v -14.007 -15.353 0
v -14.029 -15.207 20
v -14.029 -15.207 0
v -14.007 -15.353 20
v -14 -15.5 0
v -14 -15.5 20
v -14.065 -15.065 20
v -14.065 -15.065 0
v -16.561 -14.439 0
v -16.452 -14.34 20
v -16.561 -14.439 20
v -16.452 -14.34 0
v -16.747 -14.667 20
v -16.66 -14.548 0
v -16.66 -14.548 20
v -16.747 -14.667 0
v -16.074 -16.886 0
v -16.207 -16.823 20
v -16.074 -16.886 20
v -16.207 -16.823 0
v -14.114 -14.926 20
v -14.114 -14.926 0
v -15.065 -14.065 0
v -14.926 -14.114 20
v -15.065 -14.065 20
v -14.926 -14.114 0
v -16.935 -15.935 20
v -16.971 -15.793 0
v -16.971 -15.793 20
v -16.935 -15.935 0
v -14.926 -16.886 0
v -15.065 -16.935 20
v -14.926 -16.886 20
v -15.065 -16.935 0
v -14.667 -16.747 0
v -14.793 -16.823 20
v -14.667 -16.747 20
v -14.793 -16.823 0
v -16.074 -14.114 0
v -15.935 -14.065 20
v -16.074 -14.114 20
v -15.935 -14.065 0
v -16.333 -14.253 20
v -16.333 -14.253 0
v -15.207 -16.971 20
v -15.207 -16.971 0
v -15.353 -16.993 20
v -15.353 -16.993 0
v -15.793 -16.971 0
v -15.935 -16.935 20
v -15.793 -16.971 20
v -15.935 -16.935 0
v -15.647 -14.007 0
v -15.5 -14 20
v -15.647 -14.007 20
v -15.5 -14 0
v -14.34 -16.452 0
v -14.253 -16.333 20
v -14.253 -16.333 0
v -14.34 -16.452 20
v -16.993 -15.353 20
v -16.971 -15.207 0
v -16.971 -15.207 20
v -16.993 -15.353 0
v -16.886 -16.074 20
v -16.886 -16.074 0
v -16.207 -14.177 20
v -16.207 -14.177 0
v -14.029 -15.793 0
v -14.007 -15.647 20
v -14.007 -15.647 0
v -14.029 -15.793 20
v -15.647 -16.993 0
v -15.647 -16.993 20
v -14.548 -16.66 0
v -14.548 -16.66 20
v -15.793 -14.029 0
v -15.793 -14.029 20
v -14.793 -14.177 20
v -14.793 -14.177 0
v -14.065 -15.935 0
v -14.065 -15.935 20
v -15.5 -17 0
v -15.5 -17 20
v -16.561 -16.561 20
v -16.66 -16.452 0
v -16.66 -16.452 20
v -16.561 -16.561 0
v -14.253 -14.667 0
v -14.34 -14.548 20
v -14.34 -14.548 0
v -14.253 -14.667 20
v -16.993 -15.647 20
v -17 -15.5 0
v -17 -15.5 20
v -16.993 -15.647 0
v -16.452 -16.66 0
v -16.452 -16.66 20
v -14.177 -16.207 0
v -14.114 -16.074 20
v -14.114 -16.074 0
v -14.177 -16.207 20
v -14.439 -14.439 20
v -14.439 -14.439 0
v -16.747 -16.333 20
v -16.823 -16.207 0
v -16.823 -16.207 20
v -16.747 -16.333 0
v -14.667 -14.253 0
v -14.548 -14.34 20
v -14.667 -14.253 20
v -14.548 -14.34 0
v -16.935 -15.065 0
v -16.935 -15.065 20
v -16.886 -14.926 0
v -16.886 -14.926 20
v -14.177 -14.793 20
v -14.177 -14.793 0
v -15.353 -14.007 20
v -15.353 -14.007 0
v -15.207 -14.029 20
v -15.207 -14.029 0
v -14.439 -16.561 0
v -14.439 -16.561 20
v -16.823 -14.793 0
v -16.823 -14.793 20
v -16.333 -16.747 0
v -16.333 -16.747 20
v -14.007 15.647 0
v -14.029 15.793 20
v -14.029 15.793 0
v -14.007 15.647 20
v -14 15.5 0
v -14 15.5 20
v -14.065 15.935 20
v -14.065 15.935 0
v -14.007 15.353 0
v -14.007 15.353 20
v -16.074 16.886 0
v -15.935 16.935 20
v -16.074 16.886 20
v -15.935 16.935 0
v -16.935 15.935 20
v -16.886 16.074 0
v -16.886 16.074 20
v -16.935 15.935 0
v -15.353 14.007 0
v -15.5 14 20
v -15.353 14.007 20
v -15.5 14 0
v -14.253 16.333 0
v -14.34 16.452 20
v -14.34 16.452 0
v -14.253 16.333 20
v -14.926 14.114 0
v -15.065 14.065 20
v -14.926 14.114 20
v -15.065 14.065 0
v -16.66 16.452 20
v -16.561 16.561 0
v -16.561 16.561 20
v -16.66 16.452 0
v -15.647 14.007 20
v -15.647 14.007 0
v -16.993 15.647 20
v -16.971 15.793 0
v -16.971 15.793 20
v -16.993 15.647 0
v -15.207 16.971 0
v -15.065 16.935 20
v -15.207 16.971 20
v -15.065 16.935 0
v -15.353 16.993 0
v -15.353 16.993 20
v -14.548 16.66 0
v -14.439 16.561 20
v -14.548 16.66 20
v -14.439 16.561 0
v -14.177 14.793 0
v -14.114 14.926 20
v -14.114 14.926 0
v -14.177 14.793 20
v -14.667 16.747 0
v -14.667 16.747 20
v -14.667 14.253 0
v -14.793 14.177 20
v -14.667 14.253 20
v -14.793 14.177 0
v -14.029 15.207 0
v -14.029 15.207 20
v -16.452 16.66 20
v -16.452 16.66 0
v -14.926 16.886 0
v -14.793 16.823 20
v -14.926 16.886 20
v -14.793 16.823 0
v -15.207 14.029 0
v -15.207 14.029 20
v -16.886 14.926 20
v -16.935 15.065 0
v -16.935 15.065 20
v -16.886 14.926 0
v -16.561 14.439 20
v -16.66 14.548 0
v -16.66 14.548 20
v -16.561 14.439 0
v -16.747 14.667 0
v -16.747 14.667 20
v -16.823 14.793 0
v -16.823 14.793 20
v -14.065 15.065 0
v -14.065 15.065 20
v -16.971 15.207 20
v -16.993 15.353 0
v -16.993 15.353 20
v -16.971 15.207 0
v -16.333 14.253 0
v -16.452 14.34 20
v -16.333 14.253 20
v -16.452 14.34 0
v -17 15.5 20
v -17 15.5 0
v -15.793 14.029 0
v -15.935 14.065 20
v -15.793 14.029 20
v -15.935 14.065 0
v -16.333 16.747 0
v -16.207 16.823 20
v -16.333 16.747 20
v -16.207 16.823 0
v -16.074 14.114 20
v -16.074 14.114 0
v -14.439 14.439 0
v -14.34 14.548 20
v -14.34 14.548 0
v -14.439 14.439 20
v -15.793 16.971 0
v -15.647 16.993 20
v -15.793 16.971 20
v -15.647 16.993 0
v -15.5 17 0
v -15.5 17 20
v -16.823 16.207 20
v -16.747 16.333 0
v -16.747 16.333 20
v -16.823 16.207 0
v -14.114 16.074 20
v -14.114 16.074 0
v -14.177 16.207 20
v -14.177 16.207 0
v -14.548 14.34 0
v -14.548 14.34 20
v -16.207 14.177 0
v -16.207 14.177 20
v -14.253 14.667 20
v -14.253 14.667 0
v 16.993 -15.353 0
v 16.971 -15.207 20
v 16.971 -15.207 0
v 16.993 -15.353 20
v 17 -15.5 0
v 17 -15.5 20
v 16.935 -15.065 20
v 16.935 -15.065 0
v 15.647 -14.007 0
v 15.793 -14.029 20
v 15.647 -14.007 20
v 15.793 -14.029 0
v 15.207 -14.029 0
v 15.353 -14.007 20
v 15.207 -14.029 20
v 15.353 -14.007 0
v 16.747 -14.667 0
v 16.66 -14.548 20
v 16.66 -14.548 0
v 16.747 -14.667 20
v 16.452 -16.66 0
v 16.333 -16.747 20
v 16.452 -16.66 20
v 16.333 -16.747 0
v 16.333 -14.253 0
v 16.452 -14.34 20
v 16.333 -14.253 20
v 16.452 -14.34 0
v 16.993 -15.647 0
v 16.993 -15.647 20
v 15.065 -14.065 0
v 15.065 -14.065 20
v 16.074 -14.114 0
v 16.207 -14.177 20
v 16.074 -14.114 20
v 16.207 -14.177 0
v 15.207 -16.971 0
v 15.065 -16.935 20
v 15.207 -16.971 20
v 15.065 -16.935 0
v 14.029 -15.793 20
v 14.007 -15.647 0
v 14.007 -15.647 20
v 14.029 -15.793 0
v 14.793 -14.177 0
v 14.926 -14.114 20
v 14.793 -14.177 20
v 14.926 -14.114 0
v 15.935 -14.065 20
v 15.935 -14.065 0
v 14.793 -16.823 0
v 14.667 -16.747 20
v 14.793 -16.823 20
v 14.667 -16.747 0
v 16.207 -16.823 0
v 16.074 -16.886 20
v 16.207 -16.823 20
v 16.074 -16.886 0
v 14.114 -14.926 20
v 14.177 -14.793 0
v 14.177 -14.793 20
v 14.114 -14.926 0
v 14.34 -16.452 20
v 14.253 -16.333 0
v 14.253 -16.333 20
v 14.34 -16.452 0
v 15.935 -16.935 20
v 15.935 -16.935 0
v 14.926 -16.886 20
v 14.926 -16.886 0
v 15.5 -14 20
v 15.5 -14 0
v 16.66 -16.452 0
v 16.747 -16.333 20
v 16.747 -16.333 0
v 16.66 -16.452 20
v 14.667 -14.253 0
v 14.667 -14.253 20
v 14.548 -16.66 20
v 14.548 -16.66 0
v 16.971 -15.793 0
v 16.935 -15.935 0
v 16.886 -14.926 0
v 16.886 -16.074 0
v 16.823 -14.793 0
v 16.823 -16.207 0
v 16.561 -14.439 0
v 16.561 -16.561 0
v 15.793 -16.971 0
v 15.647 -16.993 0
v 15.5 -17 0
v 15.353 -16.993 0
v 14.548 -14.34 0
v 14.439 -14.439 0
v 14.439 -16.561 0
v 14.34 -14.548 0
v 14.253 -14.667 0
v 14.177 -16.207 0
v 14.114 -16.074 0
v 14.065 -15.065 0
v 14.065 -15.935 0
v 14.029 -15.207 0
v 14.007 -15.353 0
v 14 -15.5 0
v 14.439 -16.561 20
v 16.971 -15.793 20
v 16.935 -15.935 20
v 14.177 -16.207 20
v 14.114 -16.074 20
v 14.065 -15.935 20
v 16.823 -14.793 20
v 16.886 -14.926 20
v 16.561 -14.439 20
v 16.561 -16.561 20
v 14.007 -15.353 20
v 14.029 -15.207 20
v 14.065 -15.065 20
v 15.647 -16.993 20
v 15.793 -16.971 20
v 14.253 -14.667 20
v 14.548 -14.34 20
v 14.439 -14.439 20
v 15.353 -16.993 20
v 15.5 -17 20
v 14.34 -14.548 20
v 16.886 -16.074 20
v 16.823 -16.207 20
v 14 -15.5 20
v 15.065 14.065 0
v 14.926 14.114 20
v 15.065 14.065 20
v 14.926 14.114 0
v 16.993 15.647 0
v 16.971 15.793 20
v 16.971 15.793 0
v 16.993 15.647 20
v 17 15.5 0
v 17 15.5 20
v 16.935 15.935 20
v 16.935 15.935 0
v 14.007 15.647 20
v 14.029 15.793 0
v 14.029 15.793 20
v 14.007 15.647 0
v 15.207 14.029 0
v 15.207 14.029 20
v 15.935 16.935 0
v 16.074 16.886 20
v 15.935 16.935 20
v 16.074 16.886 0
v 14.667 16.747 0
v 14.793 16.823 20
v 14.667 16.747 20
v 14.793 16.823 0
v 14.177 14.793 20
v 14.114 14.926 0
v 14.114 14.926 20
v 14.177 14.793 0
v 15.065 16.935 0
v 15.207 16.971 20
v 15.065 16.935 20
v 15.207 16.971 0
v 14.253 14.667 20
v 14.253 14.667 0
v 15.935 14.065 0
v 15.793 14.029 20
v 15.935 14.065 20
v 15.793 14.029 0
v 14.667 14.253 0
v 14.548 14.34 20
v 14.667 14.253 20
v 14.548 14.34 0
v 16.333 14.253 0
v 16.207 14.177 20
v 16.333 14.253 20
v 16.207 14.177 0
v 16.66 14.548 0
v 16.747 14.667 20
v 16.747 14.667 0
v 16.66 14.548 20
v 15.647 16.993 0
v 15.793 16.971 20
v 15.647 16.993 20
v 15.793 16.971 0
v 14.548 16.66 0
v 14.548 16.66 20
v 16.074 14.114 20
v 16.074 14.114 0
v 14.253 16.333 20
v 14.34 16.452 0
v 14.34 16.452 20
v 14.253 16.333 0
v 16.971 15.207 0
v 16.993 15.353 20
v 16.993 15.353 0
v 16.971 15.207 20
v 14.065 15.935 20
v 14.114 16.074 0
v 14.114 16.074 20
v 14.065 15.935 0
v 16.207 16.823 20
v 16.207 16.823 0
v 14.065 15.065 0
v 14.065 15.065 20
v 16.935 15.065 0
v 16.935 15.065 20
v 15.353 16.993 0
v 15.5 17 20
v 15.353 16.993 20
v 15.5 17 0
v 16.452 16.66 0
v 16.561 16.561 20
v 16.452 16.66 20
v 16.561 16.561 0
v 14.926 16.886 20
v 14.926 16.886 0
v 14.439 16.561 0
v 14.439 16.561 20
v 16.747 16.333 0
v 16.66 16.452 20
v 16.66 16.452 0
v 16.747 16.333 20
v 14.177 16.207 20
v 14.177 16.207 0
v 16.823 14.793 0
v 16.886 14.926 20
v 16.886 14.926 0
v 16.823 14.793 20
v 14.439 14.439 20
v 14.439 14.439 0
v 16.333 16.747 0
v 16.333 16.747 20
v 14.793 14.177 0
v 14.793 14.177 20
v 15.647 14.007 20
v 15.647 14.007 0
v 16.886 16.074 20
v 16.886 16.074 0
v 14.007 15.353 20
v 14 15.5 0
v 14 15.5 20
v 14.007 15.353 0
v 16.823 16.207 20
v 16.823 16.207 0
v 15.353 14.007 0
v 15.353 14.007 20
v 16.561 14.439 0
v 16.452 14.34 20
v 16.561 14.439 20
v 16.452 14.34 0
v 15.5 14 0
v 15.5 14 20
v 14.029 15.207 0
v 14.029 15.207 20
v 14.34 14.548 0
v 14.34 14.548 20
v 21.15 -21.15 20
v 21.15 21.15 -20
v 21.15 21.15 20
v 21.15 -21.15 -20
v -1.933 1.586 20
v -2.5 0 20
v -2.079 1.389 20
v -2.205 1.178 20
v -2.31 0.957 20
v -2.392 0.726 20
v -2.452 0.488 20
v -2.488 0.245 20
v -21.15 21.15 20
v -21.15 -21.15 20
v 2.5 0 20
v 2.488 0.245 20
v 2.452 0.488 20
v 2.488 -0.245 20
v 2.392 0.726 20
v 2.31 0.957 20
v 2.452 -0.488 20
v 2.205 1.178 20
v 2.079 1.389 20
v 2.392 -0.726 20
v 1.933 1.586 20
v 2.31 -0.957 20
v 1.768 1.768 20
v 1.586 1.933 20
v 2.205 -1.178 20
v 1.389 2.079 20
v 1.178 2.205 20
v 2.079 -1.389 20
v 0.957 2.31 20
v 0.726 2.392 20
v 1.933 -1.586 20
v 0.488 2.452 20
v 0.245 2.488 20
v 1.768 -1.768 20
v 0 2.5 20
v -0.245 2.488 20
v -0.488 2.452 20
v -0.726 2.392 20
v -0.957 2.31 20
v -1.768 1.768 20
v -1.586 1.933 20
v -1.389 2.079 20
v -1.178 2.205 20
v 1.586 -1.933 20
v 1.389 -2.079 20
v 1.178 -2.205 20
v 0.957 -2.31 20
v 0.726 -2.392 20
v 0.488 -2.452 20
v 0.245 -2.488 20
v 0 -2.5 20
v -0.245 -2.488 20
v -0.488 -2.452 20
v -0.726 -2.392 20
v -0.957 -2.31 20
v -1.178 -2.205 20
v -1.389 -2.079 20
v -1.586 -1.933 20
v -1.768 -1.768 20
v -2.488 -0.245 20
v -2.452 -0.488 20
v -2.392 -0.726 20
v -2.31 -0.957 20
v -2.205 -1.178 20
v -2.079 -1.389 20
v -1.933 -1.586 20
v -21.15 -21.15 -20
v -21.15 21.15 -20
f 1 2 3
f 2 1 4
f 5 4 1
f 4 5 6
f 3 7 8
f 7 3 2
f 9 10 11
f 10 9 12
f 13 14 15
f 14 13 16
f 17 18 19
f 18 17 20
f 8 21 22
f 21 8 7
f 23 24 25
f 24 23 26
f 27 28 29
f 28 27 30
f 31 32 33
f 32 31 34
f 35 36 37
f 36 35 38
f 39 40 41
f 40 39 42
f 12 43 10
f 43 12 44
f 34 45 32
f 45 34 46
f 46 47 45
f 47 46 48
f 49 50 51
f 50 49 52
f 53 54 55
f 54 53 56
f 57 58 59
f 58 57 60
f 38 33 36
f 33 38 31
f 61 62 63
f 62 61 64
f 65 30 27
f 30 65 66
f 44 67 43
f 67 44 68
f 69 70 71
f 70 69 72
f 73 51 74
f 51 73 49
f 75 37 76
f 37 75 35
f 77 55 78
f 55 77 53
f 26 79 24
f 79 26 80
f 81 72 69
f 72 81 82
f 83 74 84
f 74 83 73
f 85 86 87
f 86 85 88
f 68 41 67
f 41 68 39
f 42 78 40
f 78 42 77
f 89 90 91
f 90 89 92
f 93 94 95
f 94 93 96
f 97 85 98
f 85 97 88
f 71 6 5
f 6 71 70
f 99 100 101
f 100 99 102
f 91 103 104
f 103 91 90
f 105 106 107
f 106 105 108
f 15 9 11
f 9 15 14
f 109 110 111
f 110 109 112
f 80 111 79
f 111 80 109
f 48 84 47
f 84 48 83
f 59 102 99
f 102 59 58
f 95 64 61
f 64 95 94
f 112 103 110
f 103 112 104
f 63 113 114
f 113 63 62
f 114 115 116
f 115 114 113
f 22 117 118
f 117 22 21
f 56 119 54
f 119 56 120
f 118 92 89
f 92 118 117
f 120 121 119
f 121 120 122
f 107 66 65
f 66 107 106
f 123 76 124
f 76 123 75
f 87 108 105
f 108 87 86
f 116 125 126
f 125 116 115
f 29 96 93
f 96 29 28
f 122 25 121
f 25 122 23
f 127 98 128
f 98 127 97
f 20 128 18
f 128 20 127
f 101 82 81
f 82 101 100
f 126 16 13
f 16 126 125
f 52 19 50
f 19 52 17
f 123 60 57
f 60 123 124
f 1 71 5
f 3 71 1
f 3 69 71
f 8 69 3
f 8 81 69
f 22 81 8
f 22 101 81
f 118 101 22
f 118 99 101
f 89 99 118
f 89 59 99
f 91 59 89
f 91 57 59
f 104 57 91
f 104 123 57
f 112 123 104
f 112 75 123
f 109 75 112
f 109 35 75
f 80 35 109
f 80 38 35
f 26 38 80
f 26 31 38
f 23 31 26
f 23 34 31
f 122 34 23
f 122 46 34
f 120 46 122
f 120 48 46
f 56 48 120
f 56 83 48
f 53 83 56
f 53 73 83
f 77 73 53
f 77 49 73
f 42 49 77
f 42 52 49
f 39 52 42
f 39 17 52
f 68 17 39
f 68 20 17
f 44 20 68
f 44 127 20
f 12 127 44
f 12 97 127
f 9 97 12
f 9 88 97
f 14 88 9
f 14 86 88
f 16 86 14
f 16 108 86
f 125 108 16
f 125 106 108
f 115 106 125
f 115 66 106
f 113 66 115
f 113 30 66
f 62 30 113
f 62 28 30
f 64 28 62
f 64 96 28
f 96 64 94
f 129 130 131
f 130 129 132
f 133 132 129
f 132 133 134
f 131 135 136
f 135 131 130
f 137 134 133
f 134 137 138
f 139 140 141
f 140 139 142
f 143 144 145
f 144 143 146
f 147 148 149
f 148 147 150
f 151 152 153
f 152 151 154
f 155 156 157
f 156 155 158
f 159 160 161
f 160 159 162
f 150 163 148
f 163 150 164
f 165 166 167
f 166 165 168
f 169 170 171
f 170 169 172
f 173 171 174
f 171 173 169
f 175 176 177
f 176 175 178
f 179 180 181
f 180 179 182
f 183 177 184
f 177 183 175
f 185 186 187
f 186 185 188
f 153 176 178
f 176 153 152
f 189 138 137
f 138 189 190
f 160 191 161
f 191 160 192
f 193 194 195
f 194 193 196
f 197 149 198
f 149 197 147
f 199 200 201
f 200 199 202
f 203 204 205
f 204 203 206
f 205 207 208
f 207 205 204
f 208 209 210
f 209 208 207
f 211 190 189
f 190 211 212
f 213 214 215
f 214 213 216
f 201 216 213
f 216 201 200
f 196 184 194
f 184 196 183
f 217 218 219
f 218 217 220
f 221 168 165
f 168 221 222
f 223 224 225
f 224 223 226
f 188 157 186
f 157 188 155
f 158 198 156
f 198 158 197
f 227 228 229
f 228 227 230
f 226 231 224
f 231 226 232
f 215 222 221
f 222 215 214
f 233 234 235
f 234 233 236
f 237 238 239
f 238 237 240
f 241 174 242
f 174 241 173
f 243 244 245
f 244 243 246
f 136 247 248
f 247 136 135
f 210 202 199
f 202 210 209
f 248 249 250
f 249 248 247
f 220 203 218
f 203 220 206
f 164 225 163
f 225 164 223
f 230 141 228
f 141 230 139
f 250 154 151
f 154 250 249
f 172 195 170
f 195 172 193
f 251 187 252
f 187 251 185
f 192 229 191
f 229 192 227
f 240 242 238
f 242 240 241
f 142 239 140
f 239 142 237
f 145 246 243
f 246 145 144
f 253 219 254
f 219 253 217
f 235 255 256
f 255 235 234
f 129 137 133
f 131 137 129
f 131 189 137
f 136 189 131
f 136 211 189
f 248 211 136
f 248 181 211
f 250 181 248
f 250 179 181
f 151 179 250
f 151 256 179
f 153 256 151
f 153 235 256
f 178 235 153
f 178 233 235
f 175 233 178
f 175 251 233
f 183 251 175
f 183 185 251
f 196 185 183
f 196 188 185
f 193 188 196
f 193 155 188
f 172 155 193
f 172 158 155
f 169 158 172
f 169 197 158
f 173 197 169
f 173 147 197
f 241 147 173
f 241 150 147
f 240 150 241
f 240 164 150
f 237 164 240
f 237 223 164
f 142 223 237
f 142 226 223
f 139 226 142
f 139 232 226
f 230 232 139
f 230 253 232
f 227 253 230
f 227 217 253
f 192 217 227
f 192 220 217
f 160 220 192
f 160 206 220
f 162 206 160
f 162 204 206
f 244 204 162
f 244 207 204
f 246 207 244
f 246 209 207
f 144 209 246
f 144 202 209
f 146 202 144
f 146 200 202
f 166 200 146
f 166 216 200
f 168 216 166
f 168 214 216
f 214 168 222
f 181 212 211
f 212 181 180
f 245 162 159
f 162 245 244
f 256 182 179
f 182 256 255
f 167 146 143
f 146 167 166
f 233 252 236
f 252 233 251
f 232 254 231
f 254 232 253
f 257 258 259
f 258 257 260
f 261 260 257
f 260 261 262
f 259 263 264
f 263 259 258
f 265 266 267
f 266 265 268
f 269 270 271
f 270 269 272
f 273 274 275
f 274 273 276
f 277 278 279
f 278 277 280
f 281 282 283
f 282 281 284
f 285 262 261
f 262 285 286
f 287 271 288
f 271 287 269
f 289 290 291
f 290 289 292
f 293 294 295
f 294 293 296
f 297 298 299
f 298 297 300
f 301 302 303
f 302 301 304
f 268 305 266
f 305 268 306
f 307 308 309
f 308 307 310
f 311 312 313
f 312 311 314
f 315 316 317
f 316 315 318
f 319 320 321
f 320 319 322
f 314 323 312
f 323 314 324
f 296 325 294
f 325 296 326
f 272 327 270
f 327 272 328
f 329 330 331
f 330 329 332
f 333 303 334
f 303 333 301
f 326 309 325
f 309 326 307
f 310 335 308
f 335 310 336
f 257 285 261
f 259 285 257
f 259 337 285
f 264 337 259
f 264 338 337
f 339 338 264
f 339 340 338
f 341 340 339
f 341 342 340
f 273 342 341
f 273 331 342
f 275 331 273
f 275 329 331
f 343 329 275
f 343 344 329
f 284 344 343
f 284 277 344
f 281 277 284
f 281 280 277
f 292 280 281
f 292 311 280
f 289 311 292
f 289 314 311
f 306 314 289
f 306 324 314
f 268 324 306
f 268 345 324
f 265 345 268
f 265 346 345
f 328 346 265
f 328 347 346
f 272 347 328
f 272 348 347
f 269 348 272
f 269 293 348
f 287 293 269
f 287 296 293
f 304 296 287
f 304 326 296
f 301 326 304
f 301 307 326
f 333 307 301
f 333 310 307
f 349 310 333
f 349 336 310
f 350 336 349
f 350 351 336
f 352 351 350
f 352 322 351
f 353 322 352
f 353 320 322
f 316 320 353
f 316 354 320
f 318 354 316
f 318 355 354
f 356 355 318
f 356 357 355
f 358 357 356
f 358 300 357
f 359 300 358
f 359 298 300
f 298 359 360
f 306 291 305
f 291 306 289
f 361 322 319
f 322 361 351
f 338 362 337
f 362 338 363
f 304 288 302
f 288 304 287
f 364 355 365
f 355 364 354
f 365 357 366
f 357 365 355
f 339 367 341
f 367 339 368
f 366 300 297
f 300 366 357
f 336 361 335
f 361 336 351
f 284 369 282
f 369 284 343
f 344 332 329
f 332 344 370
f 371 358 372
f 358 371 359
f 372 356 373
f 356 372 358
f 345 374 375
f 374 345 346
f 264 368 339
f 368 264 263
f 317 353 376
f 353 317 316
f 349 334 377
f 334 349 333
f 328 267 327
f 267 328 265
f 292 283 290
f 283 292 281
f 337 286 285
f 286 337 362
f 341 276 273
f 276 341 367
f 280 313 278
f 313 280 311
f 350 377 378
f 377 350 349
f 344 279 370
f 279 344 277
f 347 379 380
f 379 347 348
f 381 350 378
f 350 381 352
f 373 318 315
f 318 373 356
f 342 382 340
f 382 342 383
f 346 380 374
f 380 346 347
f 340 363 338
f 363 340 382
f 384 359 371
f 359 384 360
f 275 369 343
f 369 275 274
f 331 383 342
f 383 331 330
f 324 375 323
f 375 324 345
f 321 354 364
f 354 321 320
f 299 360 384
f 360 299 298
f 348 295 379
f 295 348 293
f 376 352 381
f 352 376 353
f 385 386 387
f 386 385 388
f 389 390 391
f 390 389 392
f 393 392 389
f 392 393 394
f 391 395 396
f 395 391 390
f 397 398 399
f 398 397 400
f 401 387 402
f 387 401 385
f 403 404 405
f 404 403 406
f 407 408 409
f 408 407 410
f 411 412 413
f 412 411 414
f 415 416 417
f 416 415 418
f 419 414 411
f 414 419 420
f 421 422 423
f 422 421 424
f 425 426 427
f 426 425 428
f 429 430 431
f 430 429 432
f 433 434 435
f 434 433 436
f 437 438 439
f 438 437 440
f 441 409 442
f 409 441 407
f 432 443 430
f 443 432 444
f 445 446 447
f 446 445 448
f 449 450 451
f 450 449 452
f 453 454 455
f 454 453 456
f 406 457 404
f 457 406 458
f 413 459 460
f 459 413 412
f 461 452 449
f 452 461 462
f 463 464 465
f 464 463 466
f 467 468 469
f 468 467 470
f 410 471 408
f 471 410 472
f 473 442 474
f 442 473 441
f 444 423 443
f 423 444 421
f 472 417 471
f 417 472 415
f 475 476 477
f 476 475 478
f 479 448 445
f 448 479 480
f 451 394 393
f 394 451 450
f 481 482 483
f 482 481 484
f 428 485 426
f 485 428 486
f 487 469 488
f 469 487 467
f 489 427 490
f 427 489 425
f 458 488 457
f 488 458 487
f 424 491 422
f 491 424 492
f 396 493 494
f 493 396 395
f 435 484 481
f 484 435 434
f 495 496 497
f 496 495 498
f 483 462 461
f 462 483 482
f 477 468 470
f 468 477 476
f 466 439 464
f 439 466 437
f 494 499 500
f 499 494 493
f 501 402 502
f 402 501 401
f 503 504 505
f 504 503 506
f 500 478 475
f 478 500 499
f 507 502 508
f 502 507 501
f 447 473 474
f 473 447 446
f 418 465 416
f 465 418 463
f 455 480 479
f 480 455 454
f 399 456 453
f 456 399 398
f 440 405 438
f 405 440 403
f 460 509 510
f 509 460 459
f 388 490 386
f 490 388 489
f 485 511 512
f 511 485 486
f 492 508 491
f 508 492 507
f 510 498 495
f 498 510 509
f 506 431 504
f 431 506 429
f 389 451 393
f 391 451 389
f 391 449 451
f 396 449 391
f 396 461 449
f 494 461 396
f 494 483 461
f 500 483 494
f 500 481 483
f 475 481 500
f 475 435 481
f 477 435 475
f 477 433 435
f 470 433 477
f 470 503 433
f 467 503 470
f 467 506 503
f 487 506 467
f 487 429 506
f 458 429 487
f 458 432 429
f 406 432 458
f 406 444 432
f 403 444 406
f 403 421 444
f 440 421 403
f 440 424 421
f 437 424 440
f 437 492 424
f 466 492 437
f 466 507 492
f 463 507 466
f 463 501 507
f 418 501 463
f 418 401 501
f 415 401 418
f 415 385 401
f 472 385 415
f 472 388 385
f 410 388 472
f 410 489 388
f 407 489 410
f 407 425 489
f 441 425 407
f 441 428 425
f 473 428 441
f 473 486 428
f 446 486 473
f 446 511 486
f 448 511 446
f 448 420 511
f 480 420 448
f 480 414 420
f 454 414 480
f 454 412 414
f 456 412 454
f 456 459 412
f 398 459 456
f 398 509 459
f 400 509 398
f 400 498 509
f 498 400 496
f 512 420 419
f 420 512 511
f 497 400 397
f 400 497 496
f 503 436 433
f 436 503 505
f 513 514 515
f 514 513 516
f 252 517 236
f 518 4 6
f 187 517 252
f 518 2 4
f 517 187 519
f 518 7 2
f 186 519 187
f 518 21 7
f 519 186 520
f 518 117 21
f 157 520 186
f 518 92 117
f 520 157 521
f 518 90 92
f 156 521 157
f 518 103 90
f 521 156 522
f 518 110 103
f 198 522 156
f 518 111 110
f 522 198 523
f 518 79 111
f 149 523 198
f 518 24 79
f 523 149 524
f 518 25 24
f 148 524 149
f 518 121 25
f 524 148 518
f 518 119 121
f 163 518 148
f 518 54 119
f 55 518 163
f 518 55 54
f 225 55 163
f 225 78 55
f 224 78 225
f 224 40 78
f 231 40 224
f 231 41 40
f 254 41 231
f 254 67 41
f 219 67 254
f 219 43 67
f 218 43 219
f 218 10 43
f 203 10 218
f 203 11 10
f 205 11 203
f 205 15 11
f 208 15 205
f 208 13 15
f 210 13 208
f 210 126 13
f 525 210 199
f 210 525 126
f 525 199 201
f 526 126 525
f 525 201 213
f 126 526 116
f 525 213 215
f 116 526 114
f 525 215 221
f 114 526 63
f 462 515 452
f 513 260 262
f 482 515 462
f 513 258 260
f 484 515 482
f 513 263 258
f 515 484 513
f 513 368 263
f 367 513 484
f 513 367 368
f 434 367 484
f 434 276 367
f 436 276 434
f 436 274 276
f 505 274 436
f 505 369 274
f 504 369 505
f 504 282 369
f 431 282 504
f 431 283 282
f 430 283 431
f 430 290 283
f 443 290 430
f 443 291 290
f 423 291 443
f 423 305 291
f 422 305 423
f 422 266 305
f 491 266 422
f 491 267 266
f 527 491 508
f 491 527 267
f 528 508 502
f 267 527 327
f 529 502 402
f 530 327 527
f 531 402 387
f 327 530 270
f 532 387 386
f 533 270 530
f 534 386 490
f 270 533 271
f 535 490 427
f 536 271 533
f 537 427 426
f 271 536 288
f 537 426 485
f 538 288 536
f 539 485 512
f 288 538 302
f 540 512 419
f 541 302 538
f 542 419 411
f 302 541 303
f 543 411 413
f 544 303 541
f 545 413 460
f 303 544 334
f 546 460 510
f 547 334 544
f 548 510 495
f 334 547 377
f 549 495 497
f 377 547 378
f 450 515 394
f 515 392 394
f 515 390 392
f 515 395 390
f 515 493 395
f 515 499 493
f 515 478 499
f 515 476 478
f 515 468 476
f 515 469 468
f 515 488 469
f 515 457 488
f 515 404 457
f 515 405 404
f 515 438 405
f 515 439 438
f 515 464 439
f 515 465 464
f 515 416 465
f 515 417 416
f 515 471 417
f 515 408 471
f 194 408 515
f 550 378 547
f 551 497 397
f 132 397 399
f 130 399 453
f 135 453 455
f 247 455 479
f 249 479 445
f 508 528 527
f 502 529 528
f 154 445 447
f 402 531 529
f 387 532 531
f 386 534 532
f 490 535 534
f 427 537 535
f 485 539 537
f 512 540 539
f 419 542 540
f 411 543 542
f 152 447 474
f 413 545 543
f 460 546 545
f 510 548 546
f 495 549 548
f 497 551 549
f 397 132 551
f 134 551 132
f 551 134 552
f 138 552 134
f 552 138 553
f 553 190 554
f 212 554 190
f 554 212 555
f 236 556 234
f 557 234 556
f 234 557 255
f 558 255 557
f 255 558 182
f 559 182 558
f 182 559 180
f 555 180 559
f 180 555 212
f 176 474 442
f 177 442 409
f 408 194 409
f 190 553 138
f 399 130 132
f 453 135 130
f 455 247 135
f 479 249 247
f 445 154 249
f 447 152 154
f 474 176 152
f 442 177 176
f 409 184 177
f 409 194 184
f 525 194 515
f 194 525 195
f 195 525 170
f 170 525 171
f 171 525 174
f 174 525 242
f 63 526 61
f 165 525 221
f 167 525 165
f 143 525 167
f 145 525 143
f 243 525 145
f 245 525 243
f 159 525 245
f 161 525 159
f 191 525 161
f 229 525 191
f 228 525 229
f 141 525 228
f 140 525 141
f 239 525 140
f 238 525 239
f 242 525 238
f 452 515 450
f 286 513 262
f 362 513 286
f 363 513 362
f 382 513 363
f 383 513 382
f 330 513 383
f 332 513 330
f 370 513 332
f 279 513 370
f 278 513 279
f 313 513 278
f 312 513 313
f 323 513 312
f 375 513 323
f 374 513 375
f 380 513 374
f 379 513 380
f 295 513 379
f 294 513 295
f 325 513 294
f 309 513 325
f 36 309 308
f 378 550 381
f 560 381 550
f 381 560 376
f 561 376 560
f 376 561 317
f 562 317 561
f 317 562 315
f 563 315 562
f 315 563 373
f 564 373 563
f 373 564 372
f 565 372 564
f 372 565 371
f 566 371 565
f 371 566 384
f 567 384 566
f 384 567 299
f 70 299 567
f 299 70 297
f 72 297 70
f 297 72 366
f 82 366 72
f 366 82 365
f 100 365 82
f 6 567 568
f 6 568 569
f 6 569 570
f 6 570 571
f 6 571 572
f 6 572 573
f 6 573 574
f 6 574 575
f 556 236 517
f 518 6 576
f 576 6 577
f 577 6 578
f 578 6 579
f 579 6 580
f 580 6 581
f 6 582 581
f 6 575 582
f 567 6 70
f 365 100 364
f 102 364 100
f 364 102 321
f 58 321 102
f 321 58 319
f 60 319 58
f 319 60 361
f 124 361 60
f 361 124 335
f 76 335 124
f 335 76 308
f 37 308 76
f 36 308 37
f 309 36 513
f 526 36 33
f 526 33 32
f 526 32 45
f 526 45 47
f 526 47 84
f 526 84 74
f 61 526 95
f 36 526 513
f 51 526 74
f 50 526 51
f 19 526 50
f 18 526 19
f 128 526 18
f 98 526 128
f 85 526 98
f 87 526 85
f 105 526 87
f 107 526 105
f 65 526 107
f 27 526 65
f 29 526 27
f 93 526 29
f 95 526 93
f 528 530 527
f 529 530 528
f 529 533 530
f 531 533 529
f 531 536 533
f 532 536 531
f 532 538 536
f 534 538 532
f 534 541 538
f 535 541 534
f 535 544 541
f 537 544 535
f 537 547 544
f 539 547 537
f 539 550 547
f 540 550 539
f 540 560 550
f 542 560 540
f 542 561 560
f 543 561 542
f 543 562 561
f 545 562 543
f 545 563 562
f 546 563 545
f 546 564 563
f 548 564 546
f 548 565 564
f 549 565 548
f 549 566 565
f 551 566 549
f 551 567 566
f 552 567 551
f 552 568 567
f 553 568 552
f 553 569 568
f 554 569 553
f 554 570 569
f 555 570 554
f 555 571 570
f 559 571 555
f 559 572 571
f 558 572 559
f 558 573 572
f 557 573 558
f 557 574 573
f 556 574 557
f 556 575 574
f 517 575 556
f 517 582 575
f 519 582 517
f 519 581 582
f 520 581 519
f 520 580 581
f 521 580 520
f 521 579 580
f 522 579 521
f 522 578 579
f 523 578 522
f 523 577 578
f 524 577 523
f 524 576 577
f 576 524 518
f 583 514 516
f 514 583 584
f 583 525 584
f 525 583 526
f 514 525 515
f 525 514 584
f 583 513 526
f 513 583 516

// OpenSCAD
module stepper_motor() {
    difference() {
        // Main body of the motor
        translate([-21.15, -21.15, -20])
            cube([42.3, 42.3, 40], center=false);
        
        // Shaft
        translate([0, 0, 20])
            cylinder(h=10, d=5, $fn=64);
        
        // Mounting holes
        for (x = [-15.5, 15.5])
            for (y = [-15.5, 15.5])
                translate([x, y, 0])
                    cylinder(h=40, d=3, $fn=64);
    }
}

stepper_motor();
